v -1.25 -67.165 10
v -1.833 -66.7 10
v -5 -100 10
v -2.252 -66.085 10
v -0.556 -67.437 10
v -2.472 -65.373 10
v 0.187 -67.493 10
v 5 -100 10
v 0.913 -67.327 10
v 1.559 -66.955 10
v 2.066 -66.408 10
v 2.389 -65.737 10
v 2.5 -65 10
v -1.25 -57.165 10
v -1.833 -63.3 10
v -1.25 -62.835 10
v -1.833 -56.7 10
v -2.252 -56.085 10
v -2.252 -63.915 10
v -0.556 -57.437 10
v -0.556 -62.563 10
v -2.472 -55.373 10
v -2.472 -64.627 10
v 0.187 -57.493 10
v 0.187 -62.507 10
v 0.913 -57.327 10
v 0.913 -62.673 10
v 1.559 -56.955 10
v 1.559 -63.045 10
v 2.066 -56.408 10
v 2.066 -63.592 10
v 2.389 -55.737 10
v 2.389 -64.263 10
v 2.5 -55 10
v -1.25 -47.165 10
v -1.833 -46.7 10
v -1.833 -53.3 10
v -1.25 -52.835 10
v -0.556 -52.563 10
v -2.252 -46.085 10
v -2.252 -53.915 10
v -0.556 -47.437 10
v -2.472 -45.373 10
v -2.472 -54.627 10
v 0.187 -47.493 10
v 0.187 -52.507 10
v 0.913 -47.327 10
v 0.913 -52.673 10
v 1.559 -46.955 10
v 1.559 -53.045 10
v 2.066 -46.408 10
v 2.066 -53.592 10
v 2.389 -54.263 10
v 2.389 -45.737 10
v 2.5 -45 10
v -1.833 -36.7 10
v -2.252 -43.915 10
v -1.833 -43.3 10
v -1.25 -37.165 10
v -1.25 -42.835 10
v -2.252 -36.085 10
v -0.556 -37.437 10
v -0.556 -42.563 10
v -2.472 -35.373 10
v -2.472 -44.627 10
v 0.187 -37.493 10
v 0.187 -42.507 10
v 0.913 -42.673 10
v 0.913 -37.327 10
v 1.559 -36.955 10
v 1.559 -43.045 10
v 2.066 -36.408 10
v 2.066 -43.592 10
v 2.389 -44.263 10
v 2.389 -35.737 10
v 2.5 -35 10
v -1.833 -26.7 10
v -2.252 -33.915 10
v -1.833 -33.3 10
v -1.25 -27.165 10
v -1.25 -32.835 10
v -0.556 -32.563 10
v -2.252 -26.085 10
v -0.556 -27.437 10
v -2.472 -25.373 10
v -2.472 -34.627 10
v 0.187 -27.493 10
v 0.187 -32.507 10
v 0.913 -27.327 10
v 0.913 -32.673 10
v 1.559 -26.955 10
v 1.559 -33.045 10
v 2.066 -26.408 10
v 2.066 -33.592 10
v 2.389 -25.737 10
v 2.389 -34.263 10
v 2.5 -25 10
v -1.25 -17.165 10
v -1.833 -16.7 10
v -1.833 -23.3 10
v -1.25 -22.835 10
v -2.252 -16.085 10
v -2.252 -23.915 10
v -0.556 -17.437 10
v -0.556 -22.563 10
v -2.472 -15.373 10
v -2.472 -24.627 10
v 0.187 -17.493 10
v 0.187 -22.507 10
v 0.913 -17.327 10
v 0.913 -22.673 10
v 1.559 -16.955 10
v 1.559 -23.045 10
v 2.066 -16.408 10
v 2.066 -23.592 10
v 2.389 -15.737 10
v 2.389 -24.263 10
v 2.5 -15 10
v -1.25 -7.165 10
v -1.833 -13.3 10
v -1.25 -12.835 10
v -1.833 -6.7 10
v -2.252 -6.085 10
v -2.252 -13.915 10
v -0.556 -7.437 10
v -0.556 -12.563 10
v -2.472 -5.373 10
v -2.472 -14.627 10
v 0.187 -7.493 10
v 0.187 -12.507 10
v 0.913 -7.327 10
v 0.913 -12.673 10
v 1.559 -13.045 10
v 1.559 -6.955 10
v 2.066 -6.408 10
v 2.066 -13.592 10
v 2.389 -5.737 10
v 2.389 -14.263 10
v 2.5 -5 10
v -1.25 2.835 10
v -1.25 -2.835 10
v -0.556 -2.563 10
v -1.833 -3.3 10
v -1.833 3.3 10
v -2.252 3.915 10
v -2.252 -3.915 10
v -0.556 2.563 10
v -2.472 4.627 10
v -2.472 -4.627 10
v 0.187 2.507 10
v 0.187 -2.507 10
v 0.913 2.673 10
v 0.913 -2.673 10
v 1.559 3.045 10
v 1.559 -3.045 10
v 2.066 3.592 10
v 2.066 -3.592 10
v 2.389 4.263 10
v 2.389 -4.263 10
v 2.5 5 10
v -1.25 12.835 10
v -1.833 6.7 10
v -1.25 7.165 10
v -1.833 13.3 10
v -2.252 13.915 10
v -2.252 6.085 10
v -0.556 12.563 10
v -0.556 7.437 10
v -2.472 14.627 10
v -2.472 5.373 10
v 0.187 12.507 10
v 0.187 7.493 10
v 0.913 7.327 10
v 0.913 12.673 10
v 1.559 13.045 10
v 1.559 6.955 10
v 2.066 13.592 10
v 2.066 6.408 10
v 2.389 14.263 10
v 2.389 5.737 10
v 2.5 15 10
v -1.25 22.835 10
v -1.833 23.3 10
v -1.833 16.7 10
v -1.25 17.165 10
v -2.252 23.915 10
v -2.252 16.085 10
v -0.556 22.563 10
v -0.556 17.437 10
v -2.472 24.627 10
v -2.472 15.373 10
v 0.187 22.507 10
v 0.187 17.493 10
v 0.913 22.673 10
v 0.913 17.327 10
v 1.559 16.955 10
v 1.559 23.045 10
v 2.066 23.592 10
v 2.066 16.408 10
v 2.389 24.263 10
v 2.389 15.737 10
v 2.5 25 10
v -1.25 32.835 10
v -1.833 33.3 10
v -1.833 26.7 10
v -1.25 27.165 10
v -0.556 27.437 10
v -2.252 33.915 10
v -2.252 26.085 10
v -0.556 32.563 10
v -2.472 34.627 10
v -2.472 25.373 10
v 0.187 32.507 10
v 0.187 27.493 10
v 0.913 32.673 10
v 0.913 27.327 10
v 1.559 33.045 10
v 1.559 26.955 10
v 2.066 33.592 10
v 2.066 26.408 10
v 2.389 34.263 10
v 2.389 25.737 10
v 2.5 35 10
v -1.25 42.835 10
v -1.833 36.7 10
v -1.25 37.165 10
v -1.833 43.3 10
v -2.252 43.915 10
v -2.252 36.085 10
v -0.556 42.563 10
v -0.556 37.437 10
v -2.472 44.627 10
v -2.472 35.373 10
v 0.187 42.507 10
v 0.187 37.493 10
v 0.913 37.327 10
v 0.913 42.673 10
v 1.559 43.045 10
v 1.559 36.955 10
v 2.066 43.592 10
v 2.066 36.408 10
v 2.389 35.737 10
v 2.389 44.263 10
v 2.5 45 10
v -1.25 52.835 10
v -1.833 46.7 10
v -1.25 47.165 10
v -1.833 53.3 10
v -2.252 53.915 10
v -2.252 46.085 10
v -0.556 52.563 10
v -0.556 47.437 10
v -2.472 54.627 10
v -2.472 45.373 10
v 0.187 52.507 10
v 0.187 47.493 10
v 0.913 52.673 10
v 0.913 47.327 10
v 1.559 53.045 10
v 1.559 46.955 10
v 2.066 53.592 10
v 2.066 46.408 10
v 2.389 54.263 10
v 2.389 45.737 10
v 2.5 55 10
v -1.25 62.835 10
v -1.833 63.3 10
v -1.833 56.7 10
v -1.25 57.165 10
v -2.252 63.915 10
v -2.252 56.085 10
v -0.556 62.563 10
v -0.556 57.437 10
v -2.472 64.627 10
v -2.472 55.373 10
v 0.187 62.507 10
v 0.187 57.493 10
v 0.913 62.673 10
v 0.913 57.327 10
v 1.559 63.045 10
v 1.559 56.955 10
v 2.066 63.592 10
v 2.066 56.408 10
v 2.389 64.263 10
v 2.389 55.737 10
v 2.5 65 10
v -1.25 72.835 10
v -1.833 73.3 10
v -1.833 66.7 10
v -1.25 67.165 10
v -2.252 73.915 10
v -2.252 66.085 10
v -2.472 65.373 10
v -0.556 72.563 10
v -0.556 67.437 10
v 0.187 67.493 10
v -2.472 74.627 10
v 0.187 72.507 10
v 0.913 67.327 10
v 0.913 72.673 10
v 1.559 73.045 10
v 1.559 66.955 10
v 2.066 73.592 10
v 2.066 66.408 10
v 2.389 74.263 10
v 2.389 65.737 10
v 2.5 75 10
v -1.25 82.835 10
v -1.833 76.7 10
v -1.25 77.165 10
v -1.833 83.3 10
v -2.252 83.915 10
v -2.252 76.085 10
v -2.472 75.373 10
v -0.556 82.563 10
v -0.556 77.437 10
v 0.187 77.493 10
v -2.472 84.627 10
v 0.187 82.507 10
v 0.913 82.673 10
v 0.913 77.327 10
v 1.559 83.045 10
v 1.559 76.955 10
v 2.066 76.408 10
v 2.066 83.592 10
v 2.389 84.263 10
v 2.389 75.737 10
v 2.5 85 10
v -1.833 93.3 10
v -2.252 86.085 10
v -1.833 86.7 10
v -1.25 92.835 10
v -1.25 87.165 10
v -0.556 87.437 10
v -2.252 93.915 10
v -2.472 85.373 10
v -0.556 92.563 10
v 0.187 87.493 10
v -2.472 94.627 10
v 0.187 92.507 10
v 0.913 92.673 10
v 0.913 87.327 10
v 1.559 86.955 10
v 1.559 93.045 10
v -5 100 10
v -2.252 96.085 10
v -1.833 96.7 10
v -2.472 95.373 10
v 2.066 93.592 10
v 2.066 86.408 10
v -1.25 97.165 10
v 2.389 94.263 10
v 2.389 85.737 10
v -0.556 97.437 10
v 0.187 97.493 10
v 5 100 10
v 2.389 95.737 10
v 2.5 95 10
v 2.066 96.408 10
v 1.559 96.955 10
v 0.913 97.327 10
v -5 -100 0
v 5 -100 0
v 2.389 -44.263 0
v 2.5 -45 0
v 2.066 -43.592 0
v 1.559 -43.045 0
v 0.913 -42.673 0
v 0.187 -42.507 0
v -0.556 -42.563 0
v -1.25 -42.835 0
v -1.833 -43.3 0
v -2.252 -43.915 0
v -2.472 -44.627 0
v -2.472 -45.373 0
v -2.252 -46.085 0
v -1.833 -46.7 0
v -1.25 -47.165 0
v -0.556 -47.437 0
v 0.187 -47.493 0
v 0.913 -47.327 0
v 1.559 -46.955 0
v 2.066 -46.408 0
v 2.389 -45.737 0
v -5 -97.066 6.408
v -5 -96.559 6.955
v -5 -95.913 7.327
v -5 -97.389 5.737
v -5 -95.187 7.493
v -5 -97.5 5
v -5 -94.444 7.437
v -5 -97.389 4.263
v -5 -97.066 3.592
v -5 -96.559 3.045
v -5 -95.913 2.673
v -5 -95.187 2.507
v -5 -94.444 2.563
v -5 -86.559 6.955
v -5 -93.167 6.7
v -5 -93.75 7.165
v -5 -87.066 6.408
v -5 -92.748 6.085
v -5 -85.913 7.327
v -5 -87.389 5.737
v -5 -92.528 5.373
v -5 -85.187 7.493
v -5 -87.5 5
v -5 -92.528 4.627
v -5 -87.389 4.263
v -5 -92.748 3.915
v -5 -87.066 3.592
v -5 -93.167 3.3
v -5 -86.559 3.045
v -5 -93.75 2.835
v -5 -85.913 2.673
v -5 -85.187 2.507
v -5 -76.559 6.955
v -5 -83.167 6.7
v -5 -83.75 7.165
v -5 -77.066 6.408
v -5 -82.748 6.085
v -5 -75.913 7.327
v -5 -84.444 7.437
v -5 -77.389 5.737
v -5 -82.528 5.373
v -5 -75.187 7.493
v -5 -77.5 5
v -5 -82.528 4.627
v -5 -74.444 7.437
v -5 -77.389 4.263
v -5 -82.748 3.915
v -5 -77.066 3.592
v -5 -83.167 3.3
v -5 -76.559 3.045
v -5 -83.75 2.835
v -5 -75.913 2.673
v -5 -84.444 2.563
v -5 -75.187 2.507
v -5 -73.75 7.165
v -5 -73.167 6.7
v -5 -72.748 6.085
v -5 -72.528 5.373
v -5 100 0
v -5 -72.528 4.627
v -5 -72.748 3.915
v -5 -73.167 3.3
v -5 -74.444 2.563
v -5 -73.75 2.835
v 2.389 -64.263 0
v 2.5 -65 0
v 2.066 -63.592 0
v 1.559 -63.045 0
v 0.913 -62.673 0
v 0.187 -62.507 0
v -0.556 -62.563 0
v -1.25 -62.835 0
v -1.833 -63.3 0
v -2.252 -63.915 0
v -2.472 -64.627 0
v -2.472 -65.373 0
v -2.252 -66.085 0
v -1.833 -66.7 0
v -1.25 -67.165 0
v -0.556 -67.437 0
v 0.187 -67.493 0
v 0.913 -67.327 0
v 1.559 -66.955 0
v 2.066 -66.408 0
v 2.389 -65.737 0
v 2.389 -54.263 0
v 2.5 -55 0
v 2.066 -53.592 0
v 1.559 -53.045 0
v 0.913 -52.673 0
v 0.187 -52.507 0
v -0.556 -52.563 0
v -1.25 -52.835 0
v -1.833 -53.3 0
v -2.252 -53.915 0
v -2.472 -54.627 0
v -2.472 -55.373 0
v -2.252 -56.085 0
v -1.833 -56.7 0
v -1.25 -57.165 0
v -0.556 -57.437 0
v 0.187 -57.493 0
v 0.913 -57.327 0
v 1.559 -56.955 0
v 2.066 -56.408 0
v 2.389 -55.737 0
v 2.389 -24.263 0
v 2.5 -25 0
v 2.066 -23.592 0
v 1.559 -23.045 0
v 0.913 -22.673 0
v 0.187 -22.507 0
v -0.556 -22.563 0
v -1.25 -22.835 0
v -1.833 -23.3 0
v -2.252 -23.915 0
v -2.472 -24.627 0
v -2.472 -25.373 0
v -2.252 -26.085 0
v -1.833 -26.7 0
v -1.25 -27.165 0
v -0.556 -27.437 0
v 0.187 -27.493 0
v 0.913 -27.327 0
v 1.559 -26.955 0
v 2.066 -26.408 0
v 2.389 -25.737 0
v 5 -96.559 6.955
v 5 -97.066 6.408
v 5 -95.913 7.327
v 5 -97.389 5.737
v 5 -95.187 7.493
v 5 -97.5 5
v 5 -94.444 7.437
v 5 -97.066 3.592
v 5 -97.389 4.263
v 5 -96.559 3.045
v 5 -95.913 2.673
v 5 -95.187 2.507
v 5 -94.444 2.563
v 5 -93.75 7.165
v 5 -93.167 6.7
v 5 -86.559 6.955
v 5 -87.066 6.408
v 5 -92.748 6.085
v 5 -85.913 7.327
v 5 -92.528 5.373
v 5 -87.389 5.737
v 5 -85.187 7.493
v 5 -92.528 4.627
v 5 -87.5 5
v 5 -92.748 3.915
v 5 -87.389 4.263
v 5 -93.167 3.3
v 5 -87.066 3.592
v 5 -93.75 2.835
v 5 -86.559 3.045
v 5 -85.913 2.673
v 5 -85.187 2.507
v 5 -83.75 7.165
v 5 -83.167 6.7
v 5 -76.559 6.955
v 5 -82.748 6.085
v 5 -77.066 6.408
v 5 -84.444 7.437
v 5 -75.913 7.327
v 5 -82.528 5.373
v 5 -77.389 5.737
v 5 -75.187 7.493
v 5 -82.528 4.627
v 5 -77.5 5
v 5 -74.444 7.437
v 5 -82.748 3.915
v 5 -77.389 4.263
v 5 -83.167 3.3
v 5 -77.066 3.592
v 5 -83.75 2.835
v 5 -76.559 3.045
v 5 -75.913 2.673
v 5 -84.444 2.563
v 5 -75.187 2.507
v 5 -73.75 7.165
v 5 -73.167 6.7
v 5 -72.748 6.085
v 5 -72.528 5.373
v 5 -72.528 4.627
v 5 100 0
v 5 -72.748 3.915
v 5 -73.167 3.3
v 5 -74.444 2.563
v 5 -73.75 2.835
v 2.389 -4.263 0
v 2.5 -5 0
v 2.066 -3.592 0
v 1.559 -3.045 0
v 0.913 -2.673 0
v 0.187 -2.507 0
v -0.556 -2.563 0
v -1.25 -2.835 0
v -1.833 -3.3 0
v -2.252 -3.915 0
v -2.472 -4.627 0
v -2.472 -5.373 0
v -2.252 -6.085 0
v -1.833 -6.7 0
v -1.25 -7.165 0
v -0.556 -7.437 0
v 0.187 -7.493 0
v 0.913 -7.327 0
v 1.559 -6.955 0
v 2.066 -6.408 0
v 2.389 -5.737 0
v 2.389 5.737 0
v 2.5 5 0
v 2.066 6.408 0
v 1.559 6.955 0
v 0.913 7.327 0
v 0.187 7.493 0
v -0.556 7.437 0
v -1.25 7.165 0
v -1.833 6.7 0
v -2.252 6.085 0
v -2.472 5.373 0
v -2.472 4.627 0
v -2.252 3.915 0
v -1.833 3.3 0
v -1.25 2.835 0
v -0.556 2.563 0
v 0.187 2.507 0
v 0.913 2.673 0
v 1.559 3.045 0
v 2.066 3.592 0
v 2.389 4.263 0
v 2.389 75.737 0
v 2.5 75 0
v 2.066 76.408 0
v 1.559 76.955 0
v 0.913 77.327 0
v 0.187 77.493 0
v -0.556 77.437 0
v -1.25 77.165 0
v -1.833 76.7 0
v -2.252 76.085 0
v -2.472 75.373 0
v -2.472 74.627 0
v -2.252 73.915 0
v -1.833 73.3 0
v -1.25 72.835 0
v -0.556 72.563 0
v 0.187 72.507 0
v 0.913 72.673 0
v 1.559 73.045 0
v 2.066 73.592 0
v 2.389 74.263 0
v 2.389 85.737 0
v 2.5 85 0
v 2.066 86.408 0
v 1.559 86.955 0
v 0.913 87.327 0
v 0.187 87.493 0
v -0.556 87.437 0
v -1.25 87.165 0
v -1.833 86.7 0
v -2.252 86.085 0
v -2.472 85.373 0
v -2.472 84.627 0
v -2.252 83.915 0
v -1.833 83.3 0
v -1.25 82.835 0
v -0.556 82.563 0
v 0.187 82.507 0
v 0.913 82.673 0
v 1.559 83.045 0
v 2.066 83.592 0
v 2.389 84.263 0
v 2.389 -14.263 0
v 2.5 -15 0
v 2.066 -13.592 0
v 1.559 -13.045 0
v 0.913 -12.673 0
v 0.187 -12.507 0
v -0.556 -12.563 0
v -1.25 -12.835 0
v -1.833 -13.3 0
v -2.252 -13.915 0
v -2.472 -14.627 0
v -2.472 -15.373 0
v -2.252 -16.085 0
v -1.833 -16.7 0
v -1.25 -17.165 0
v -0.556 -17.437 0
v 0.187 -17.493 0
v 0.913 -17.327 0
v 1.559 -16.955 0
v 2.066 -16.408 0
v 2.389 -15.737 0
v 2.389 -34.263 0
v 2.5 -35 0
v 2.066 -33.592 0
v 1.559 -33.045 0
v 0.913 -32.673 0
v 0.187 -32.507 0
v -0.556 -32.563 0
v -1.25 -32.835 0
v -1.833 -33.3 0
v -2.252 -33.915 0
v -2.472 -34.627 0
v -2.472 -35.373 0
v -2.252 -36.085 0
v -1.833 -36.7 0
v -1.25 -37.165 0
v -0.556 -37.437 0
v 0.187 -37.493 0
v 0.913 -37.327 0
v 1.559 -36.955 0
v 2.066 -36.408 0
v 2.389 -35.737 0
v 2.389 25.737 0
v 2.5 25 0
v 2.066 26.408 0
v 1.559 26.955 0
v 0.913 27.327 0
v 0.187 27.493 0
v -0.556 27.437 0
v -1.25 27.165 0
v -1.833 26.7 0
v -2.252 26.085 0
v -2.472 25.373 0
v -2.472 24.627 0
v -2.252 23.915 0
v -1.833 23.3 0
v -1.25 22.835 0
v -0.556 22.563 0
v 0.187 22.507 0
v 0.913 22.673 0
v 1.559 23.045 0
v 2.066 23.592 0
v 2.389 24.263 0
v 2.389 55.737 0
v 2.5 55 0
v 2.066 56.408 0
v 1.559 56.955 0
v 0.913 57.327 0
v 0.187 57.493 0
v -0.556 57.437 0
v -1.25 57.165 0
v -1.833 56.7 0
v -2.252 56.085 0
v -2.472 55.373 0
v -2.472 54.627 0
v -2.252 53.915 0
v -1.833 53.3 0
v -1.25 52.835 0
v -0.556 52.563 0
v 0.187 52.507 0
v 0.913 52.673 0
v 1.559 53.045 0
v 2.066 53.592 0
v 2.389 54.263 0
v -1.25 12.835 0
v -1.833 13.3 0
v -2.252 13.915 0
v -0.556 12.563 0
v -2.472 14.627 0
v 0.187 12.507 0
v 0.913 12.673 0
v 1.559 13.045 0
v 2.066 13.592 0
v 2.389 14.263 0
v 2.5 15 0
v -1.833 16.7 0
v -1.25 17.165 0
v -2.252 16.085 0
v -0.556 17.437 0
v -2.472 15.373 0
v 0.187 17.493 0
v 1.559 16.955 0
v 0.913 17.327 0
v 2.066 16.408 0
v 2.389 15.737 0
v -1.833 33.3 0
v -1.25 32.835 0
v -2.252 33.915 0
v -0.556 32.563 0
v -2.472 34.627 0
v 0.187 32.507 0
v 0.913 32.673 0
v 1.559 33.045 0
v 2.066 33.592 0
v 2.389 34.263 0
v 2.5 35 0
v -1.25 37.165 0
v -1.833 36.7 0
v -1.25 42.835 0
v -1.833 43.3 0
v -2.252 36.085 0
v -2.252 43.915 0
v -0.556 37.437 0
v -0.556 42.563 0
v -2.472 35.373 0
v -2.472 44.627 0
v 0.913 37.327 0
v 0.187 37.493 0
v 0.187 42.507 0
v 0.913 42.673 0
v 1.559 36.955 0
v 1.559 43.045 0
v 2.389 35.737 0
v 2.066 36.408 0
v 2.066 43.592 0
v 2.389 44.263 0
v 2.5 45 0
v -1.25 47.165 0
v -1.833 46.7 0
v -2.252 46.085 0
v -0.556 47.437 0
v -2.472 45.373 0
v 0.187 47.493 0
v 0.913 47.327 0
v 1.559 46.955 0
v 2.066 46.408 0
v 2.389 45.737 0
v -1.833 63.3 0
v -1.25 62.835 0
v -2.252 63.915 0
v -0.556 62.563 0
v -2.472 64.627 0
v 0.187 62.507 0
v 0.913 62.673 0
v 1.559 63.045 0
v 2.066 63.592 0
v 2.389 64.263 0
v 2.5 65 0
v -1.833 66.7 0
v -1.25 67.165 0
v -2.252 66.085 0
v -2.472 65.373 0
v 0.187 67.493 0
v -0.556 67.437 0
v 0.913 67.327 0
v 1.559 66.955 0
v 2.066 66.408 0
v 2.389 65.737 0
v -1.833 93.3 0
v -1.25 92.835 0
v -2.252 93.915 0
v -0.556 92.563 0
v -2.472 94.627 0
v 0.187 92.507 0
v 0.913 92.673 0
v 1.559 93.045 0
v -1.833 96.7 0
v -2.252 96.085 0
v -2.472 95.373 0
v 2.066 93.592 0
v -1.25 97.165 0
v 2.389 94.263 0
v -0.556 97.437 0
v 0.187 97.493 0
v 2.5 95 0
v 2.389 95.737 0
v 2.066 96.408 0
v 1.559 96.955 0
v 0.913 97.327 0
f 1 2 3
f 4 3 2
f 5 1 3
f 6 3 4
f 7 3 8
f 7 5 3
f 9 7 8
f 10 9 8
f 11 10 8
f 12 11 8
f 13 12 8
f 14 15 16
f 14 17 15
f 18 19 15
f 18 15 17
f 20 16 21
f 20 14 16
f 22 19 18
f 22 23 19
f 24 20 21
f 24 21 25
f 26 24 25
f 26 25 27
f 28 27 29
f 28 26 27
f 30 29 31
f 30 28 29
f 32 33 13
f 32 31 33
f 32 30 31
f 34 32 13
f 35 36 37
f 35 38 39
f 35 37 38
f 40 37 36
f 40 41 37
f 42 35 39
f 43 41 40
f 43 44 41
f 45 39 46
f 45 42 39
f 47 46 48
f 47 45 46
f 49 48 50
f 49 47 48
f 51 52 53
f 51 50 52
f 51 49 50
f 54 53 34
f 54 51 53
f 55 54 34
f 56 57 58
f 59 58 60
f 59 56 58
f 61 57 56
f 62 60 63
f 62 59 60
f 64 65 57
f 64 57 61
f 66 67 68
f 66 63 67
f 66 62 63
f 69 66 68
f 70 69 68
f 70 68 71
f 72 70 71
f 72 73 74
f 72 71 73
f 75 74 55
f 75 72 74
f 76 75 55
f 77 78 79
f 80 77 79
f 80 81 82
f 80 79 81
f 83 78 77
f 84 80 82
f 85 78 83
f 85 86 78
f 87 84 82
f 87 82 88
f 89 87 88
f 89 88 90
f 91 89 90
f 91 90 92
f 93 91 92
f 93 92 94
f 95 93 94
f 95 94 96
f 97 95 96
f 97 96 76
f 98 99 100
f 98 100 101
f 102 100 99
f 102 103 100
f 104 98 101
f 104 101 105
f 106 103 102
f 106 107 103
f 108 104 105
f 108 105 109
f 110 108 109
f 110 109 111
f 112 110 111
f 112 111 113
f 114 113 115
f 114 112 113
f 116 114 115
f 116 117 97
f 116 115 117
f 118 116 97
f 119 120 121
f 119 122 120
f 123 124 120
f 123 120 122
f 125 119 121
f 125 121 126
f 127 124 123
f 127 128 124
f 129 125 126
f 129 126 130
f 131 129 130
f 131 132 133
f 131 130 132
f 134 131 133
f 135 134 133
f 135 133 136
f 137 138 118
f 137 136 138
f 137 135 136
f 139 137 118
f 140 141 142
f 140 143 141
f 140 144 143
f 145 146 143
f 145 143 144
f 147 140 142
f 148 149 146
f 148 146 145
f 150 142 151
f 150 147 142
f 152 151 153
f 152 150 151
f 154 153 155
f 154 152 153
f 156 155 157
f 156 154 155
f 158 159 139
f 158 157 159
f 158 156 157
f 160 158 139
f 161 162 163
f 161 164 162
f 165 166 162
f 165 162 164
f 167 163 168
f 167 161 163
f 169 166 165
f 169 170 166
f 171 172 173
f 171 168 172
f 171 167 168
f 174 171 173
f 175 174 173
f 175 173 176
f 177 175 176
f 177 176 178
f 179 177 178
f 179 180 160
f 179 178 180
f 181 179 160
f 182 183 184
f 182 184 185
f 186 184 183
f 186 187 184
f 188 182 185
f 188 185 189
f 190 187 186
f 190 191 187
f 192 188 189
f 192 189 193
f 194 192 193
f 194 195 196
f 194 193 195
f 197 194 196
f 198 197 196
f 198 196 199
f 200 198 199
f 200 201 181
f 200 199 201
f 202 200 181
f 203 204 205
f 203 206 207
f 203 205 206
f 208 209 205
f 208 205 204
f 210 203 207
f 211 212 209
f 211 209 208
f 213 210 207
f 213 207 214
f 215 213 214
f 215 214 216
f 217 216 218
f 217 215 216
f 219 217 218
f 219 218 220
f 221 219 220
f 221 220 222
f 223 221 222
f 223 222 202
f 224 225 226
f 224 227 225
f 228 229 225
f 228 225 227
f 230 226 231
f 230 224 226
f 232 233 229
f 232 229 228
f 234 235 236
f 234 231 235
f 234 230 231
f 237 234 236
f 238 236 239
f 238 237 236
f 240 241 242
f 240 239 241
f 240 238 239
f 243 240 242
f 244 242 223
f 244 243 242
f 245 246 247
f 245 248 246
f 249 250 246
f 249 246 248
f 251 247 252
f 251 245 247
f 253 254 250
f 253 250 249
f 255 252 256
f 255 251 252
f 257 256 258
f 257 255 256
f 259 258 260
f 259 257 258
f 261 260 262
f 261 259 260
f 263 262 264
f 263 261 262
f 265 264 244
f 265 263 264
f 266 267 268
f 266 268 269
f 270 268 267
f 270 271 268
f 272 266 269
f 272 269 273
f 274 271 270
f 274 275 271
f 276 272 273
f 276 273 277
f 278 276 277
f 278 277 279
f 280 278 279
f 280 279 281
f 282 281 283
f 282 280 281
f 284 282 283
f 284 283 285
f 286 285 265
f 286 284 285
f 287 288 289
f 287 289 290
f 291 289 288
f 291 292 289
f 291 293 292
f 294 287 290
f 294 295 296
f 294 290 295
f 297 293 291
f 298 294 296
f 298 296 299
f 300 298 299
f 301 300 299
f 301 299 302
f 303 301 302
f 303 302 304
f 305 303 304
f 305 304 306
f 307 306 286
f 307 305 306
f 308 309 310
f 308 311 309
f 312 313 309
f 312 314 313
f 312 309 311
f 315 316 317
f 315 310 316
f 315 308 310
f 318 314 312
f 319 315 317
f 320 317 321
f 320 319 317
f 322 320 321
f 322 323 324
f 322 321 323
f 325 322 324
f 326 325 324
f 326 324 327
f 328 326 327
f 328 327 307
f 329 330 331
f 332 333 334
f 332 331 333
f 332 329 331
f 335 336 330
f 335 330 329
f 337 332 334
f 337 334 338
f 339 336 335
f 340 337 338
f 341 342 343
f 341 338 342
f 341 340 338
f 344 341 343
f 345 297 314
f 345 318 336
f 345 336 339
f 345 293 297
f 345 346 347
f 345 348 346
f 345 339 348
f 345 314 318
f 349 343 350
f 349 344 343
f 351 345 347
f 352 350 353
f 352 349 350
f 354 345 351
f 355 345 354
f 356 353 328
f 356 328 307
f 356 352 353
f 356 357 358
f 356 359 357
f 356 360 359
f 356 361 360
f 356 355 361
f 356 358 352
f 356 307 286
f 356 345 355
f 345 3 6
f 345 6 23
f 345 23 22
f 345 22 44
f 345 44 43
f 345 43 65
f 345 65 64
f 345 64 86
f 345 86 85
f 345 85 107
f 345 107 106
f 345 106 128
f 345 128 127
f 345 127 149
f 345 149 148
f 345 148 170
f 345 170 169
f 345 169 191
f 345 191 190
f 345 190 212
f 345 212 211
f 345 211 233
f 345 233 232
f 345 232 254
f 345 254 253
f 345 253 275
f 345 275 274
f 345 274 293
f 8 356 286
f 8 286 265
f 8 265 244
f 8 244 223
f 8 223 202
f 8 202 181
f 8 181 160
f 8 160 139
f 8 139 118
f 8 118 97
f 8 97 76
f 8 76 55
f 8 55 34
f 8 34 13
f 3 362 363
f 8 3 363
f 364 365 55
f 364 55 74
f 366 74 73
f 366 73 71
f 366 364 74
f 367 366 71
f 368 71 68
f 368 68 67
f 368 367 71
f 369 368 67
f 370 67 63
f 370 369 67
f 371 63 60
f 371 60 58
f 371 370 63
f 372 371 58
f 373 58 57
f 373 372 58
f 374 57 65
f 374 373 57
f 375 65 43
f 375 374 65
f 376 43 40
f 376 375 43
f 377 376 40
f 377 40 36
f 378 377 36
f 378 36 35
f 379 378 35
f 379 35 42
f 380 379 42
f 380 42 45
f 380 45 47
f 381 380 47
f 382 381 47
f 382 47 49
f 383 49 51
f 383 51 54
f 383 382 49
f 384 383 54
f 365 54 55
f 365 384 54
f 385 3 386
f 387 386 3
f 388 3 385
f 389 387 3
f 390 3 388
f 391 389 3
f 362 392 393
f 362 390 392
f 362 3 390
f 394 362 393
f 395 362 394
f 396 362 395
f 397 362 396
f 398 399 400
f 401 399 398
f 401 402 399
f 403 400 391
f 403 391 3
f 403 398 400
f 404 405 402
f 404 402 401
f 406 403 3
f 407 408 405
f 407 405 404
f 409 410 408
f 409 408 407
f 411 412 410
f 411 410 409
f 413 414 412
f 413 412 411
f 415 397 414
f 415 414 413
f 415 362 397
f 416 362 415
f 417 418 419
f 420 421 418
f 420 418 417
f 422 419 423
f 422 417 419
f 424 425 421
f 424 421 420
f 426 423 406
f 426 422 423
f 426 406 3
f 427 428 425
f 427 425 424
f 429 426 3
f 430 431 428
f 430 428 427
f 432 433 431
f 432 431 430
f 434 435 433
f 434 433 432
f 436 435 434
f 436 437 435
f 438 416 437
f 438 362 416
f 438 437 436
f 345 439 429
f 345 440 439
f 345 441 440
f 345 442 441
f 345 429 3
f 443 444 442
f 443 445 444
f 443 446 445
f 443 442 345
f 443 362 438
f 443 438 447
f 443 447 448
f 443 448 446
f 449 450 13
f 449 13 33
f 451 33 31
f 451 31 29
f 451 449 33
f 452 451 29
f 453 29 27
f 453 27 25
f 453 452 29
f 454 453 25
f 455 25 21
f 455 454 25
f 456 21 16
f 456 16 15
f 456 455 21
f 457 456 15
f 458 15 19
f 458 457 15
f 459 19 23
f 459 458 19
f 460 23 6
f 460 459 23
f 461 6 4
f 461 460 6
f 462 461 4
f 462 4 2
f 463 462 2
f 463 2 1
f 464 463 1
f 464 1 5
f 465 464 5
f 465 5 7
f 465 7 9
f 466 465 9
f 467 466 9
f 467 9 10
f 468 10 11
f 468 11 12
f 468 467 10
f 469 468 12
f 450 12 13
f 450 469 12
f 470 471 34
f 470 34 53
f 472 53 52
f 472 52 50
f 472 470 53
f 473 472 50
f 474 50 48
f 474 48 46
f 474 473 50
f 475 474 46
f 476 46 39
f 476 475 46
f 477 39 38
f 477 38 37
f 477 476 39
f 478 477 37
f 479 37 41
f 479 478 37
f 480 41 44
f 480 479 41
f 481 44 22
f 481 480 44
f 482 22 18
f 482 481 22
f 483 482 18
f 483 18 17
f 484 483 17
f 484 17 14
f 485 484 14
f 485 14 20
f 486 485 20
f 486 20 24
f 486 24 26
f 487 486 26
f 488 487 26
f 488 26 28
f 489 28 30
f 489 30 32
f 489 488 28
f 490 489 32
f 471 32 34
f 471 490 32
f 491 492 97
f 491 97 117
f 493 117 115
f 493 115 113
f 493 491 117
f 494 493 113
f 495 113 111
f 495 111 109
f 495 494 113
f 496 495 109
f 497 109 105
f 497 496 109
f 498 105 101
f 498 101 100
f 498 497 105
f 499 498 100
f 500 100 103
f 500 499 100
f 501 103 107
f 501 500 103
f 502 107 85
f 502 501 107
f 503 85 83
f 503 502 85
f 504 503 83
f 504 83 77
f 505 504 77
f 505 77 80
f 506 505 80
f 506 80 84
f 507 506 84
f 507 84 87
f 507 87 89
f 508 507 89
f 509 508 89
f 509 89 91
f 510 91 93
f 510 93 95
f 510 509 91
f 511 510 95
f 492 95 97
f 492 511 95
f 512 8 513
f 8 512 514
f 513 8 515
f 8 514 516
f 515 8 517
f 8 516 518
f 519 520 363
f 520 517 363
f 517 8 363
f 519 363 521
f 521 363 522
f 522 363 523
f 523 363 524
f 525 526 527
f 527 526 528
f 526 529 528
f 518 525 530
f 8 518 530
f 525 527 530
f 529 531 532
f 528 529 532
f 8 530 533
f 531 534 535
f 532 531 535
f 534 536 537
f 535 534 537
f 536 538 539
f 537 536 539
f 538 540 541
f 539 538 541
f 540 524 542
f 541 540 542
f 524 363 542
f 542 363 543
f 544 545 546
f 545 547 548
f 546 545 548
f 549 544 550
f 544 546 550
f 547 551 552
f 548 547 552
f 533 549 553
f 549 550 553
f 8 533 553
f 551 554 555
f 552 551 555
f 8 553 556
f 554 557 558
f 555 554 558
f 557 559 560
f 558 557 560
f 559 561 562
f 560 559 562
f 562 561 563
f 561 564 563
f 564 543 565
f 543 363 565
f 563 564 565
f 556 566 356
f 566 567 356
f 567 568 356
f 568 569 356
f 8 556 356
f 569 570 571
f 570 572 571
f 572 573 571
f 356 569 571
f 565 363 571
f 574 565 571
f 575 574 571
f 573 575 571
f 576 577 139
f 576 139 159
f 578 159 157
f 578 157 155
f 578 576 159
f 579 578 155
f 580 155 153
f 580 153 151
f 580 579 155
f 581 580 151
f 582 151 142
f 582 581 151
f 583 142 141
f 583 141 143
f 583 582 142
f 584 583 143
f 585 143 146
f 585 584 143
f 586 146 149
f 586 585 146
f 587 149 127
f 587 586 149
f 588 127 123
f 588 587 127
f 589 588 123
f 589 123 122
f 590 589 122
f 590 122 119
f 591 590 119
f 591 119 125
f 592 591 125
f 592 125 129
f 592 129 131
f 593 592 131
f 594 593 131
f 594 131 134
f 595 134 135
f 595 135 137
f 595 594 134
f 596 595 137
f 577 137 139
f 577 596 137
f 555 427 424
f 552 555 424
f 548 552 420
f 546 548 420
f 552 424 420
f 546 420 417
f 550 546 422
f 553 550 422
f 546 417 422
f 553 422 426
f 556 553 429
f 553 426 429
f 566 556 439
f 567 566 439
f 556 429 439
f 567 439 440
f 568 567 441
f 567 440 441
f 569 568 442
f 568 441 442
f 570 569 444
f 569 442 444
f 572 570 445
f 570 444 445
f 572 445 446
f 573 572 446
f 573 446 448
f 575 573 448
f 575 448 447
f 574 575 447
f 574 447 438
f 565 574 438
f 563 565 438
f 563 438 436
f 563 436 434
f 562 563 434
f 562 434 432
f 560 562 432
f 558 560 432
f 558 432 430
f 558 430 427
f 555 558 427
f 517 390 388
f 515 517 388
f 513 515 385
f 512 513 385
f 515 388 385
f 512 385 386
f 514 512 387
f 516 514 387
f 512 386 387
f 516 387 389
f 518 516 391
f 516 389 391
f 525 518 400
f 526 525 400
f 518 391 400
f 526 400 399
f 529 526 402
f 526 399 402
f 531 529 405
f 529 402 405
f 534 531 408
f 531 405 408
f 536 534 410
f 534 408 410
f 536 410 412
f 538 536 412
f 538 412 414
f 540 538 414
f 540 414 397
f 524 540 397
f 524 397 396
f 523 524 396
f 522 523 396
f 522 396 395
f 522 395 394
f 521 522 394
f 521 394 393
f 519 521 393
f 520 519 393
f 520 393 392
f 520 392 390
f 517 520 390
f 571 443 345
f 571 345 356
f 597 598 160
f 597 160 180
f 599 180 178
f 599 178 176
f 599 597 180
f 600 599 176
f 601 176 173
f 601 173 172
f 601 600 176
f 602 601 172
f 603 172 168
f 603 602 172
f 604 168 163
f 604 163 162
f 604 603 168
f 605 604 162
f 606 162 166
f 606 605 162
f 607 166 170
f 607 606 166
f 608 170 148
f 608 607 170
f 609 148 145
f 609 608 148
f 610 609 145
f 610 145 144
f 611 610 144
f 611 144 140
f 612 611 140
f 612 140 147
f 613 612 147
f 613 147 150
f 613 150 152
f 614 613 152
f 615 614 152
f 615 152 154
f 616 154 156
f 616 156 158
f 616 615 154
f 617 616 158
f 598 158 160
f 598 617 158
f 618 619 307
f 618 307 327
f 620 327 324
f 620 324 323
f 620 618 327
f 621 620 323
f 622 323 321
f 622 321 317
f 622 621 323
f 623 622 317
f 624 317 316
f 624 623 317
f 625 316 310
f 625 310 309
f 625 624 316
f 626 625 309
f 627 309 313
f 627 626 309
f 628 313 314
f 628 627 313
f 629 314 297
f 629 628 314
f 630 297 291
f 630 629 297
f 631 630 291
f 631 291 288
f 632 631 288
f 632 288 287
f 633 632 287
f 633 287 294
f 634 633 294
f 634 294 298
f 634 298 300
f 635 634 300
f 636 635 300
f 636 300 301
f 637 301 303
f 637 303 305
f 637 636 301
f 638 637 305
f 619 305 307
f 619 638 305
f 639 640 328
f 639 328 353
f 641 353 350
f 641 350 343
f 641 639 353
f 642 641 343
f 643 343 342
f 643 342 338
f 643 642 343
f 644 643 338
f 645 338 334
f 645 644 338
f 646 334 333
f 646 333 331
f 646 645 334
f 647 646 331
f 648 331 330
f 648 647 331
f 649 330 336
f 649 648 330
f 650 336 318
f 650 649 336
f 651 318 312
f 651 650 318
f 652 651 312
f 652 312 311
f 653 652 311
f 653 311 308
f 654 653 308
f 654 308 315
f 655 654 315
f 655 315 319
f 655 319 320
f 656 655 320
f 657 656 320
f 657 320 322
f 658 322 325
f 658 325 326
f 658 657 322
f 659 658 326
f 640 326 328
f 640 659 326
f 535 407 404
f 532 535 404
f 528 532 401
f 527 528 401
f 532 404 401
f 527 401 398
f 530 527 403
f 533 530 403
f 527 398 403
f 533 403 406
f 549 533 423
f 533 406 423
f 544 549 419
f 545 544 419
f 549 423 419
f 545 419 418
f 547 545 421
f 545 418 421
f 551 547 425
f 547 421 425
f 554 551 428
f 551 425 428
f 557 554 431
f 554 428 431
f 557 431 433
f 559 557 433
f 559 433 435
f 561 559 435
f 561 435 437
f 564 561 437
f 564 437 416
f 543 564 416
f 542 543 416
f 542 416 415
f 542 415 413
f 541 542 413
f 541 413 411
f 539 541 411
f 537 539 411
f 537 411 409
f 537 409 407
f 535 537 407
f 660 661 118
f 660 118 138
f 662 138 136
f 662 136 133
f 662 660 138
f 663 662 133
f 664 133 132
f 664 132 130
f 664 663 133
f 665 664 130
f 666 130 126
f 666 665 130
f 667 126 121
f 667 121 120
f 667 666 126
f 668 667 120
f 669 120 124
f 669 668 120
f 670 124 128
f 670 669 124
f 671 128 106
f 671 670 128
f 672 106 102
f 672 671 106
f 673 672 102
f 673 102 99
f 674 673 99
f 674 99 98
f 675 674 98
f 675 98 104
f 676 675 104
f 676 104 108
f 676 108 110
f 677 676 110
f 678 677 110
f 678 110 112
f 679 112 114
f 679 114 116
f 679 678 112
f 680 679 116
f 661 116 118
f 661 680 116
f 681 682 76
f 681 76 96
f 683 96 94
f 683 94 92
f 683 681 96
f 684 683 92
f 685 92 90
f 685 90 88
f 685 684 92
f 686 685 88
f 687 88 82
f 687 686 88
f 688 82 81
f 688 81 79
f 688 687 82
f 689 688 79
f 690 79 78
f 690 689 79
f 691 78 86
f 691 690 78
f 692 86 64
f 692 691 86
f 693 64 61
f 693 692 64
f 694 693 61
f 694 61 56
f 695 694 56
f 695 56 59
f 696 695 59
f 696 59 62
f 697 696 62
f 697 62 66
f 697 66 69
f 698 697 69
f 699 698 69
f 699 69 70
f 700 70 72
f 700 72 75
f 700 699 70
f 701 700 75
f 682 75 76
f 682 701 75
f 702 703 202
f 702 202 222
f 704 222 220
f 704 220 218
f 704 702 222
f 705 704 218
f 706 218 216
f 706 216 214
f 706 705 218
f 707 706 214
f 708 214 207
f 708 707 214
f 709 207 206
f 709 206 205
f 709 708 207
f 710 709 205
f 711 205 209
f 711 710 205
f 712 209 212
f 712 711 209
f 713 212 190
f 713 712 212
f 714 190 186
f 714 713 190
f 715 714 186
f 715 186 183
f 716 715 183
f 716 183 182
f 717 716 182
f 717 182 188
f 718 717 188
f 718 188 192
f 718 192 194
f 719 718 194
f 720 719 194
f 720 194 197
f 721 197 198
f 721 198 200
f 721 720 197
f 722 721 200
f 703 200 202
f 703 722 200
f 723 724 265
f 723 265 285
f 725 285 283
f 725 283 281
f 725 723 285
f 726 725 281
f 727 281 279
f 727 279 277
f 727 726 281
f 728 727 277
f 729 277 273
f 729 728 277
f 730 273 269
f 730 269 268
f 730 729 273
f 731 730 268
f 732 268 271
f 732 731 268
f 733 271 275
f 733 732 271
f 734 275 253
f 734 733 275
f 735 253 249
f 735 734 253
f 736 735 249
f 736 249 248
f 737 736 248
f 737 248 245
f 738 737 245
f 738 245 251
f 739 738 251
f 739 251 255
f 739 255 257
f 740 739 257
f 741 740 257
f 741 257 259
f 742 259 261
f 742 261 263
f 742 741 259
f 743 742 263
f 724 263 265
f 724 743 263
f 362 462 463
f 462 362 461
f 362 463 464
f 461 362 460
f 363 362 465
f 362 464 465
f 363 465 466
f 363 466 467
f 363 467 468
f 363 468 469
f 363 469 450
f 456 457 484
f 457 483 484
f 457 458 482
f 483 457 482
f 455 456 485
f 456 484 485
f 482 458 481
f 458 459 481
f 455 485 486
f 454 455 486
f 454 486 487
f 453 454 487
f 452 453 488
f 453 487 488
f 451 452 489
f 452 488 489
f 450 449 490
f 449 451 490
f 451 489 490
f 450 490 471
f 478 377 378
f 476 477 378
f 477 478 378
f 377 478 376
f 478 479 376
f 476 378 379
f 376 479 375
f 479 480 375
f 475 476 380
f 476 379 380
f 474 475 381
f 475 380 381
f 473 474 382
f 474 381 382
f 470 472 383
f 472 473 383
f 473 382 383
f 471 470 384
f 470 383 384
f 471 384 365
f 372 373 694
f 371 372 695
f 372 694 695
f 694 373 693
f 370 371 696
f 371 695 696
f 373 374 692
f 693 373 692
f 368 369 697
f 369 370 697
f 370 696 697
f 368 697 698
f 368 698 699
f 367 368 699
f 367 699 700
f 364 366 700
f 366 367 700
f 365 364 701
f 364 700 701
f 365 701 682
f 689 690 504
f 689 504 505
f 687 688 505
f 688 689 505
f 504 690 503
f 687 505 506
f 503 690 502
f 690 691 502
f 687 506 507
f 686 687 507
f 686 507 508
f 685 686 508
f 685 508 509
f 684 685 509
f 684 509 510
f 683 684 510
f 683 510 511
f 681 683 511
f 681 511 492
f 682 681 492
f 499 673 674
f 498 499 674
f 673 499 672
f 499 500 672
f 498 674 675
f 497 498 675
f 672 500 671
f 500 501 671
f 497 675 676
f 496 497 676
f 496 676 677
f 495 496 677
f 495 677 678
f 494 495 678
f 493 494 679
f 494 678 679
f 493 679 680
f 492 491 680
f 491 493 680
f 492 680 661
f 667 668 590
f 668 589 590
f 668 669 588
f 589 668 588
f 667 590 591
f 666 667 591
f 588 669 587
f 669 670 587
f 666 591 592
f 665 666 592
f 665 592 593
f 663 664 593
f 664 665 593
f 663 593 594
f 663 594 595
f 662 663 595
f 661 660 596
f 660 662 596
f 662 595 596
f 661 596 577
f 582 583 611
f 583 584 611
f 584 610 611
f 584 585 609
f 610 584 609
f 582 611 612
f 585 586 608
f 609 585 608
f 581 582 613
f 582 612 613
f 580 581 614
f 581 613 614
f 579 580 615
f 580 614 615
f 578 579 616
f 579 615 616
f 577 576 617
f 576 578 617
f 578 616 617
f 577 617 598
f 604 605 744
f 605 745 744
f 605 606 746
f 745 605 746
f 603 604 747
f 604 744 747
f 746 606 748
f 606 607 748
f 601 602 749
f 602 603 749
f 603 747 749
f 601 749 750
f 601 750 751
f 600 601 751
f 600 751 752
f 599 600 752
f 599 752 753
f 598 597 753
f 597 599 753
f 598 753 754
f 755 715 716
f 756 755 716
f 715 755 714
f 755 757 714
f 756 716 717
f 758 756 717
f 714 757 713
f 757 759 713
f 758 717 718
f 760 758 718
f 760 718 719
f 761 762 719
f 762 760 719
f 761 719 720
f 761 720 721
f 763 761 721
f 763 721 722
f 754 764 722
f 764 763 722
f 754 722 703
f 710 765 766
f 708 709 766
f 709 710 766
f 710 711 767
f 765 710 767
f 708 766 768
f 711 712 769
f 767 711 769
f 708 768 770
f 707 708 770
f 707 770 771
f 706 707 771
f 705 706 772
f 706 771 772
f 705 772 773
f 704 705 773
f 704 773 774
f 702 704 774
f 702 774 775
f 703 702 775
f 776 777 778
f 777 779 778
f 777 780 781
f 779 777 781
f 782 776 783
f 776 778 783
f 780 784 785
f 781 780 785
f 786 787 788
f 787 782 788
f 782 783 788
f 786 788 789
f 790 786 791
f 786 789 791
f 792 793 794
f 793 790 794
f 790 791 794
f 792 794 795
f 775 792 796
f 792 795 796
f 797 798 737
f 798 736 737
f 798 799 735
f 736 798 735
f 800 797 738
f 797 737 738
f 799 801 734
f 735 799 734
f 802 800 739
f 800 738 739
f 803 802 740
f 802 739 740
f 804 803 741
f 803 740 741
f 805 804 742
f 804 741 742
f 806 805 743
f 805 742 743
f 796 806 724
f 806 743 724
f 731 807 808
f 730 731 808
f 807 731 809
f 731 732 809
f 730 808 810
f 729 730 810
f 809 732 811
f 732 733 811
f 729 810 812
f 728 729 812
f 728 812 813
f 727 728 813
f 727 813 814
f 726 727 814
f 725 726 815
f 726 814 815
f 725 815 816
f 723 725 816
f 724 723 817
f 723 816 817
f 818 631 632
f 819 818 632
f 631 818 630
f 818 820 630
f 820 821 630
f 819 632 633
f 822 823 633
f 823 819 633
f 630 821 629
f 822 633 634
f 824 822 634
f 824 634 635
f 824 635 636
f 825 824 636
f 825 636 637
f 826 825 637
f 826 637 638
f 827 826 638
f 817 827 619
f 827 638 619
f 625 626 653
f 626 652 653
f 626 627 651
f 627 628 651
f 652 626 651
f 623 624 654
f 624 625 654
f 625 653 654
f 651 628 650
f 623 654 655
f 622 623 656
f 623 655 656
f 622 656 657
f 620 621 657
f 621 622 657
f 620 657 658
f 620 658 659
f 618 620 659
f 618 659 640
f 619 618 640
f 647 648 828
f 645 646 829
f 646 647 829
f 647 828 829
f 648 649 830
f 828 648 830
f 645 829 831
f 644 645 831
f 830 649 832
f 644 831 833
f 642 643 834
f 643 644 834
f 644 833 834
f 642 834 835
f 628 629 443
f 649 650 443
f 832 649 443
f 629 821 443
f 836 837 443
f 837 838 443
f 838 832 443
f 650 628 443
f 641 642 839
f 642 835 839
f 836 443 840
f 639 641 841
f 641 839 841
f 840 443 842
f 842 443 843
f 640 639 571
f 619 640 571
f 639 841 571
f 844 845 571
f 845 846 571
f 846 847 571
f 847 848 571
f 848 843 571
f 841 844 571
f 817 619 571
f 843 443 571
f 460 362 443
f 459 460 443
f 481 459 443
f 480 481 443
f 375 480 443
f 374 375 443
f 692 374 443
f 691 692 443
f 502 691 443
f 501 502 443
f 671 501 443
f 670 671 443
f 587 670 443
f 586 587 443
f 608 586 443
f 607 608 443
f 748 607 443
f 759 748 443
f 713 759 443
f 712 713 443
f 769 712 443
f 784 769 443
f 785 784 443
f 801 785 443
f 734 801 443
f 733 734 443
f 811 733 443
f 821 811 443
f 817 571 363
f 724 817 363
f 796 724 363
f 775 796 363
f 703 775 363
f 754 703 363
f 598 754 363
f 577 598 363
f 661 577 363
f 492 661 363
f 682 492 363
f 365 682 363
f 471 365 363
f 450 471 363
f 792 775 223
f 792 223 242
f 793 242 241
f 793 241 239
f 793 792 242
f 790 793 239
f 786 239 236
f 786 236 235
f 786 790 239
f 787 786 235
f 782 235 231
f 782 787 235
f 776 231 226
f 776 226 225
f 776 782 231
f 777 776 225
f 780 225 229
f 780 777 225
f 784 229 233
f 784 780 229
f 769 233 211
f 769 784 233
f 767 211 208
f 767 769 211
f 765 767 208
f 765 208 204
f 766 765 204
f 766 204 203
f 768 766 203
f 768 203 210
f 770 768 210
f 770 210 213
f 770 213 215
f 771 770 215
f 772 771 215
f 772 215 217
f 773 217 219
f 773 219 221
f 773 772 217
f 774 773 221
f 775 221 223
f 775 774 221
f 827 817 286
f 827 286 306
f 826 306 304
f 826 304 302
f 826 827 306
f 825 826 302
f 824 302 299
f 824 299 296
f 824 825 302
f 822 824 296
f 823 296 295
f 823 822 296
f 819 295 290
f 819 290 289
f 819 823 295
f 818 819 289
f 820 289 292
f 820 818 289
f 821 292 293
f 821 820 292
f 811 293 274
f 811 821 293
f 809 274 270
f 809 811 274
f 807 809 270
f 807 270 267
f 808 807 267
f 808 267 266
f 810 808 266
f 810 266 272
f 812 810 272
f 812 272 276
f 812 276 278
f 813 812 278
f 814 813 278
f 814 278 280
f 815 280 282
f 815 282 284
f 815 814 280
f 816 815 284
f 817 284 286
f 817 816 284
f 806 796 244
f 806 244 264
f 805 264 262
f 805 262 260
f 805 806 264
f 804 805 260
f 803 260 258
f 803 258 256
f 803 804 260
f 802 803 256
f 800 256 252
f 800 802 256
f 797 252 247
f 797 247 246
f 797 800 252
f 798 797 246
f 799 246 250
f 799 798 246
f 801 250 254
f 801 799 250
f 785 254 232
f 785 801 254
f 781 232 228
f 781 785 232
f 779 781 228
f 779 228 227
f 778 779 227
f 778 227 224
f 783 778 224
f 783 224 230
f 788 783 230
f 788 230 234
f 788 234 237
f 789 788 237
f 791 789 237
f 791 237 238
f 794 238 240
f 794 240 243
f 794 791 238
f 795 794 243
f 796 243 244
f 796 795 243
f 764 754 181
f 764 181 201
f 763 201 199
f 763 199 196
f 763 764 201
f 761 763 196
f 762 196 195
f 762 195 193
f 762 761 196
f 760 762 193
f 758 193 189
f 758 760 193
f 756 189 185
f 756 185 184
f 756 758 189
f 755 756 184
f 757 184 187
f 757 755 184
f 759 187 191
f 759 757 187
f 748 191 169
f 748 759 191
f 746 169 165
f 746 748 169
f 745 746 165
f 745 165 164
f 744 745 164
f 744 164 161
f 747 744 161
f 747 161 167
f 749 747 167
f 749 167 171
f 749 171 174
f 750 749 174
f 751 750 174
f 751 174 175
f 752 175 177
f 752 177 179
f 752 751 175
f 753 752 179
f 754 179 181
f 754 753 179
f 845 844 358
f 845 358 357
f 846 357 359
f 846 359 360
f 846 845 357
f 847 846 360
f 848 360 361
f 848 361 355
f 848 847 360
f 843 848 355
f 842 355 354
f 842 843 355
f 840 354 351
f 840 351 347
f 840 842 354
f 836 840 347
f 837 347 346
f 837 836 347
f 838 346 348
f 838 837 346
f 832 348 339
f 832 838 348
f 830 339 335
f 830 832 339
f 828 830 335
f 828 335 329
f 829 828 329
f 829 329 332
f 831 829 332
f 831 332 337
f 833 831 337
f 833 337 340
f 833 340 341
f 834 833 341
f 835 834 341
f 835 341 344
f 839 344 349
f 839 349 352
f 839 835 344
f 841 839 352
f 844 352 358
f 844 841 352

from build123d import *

# Parameters (mm, degrees)
ESQUISSE1_W             = 10
ESQUISSE1_H             = 200
ESQUISSE1_R             = 2.5
BASE_DEPTH              = 10
ESQUISSE4_R             = 2.5
ENL_V_MAT_EXTRU_2_DEPTH = 101.995049384


with BuildPart() as part:
    # Esquisse1 → BASE (new body)
    with BuildSketch(Plane.XY):
        Rectangle(ESQUISSE1_W, ESQUISSE1_H)
        with Locations((0, 95)):
            Circle(ESQUISSE1_R, mode=Mode.SUBTRACT)
        with Locations((0, 85)):
            Circle(ESQUISSE1_R, mode=Mode.SUBTRACT)
        with Locations((0, 75)):
            Circle(ESQUISSE1_R, mode=Mode.SUBTRACT)
        with Locations((0, 65)):
            Circle(ESQUISSE1_R, mode=Mode.SUBTRACT)
        with Locations((0, 55)):
            Circle(ESQUISSE1_R, mode=Mode.SUBTRACT)
        with Locations((0, 45)):
            Circle(ESQUISSE1_R, mode=Mode.SUBTRACT)
        with Locations((0, 35)):
            Circle(ESQUISSE1_R, mode=Mode.SUBTRACT)
        with Locations((0, 25)):
            Circle(ESQUISSE1_R, mode=Mode.SUBTRACT)
        with Locations((0, 15)):
            Circle(ESQUISSE1_R, mode=Mode.SUBTRACT)
        with Locations((0, 5)):
            Circle(ESQUISSE1_R, mode=Mode.SUBTRACT)
        with Locations((0, -5)):
            Circle(ESQUISSE1_R, mode=Mode.SUBTRACT)
        with Locations((0, -15)):
            Circle(ESQUISSE1_R, mode=Mode.SUBTRACT)
        with Locations((0, -25)):
            Circle(ESQUISSE1_R, mode=Mode.SUBTRACT)
        with Locations((0, -35)):
            Circle(ESQUISSE1_R, mode=Mode.SUBTRACT)
        with Locations((0, -45)):
            Circle(ESQUISSE1_R, mode=Mode.SUBTRACT)
        with Locations((0, -55)):
            Circle(ESQUISSE1_R, mode=Mode.SUBTRACT)
        with Locations((0, -65)):
            Circle(ESQUISSE1_R, mode=Mode.SUBTRACT)
    extrude(amount=BASE_DEPTH)

    # Esquisse4 → Enlèv. mat.-Extru.2 (cut, through all)
    with BuildSketch(Plane.ZY.offset(5)):
        with Locations(Location((5, -95, 0), (0, 0, 270))):
            Circle(ESQUISSE4_R)
        with Locations(Location((5, -85, 0), (0, 0, 270))):
            Circle(ESQUISSE4_R)
        with Locations(Location((5, -75, 0), (0, 0, 270))):
            Circle(ESQUISSE4_R)
    extrude(amount=-ENL_V_MAT_EXTRU_2_DEPTH, mode=Mode.SUBTRACT)


solid = part.part
